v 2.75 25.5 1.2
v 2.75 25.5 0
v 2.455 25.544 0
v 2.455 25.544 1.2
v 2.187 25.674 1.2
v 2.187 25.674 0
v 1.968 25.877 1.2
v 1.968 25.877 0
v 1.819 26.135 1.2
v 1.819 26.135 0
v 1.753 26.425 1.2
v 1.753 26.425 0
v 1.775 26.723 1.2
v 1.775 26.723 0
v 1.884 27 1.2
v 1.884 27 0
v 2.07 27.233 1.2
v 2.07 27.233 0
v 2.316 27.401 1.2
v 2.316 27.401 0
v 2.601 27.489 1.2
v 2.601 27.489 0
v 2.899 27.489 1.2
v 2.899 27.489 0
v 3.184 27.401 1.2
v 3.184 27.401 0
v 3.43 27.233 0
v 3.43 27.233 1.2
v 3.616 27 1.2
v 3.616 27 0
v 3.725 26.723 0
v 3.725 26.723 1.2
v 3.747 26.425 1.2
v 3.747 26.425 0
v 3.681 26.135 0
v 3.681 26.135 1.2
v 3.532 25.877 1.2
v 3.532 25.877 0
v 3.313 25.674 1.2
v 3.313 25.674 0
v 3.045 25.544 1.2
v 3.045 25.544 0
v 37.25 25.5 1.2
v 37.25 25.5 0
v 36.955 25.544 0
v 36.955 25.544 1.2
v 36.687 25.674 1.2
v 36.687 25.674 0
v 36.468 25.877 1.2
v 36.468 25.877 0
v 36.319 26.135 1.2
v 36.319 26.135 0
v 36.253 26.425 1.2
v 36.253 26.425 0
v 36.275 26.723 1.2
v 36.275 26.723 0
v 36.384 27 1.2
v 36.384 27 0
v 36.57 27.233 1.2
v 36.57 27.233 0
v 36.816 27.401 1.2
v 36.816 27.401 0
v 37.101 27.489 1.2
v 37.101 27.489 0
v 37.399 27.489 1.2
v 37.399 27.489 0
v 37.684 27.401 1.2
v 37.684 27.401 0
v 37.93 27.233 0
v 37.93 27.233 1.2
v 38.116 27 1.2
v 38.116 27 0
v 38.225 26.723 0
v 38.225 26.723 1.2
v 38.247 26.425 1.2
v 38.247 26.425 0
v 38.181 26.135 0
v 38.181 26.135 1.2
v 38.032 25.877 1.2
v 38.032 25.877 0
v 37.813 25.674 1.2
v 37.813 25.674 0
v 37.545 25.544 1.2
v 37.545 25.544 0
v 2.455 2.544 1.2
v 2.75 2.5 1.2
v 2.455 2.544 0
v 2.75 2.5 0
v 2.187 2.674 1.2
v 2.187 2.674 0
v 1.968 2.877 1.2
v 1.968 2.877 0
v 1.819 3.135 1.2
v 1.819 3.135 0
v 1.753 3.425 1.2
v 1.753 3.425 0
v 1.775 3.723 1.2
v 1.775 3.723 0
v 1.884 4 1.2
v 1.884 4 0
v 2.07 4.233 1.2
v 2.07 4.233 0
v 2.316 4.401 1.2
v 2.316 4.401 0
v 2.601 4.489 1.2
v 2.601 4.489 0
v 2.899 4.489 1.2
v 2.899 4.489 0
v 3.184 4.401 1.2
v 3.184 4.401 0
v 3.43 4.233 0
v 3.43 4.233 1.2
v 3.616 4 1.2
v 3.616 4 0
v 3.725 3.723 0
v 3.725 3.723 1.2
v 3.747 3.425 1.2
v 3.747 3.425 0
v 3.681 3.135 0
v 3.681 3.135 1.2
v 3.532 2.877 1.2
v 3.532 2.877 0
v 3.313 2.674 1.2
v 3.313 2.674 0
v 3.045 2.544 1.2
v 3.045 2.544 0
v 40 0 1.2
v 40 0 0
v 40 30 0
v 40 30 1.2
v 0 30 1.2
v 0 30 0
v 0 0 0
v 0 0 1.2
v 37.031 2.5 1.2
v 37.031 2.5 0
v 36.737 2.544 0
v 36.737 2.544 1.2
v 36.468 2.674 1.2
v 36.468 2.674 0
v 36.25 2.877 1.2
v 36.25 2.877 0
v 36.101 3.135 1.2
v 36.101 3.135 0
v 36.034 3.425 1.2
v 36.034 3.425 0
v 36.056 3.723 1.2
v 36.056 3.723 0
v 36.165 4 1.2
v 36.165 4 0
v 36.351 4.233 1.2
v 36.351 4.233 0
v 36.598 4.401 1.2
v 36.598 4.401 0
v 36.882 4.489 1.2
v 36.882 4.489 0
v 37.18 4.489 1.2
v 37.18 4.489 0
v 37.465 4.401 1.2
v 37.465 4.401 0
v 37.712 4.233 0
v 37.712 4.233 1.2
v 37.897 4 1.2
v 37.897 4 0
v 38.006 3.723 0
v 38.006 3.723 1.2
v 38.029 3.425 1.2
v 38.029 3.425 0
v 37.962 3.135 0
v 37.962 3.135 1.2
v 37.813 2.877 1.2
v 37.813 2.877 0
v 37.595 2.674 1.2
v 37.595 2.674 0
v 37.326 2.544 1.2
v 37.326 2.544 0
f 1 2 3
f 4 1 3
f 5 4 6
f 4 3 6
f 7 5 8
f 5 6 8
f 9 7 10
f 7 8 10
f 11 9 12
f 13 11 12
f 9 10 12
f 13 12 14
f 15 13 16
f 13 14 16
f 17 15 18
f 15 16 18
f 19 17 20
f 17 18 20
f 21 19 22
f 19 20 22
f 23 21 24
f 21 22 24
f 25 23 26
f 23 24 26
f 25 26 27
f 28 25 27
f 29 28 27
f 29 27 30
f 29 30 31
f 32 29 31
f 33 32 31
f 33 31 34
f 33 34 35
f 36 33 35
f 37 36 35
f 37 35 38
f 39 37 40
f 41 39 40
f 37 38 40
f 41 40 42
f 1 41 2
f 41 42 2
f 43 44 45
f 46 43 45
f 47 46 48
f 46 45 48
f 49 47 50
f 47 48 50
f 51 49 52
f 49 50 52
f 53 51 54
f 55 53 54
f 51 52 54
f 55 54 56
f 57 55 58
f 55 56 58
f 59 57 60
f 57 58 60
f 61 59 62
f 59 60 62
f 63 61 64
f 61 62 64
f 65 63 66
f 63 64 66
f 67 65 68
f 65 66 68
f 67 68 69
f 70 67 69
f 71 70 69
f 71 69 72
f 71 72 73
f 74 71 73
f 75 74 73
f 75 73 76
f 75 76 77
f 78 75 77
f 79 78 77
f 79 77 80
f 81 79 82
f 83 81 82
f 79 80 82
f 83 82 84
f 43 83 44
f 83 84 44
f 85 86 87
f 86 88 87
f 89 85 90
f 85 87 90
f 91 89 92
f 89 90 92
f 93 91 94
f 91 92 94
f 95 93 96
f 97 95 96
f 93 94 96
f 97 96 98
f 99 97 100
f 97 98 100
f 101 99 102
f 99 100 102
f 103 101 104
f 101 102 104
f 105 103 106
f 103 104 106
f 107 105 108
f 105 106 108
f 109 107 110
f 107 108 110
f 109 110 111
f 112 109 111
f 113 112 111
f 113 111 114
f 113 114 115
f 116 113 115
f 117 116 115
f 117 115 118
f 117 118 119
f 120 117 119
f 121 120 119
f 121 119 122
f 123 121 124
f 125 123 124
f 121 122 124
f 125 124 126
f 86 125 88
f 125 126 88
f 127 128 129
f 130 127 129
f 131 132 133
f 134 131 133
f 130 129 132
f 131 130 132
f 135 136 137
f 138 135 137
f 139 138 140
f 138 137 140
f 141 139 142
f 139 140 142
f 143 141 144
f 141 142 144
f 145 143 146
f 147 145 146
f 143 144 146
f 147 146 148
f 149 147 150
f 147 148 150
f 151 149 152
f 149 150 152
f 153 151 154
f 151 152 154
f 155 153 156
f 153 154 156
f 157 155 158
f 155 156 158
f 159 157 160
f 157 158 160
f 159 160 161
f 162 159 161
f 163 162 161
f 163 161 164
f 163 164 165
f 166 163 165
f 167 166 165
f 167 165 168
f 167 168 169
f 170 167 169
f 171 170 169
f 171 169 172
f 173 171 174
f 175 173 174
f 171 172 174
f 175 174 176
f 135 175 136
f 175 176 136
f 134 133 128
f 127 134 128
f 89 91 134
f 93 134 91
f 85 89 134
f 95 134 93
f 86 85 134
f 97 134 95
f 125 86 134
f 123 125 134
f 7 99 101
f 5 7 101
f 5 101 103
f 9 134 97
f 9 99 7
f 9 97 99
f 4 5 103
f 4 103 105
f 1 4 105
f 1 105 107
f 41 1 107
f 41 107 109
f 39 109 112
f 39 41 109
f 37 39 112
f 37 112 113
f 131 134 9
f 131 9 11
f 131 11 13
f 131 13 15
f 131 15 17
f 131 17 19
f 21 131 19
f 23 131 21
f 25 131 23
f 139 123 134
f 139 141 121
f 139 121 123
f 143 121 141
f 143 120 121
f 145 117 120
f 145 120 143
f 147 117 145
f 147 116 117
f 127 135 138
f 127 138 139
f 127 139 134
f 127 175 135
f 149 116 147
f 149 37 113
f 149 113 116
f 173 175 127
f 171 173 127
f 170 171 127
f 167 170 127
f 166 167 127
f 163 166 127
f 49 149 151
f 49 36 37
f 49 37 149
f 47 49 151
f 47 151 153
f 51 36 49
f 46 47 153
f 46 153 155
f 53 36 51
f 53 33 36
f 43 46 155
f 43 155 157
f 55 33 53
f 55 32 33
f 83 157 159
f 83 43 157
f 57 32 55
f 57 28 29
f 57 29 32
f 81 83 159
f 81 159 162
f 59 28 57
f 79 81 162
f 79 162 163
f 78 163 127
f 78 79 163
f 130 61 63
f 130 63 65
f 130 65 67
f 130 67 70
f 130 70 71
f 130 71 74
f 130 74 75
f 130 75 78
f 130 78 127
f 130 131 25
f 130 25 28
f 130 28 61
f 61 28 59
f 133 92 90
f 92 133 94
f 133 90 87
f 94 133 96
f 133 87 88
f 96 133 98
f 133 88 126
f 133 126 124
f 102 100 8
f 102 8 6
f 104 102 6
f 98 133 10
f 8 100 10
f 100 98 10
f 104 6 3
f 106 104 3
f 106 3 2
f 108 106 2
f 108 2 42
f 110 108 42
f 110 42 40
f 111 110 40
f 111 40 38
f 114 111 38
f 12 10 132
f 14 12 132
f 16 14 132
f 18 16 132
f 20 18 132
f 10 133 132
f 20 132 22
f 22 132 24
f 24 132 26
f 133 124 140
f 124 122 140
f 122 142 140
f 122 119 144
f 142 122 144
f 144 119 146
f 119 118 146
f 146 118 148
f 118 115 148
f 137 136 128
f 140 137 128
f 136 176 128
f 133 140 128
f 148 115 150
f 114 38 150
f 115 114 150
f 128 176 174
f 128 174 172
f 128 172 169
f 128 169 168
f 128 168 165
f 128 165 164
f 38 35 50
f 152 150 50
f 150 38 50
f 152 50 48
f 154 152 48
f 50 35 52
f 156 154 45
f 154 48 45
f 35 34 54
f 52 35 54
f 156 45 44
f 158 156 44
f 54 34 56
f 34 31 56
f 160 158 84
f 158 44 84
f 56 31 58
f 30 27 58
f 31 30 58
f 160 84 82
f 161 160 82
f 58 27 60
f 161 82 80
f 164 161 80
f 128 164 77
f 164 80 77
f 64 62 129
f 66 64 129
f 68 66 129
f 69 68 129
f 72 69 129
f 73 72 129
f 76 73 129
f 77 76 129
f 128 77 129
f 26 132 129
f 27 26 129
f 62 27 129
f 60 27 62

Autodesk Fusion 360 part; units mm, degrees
sketch "Sketch1" plane through (0, 0, 0) normal (0, 0, 1) x (1, 0, 0)
  line L0 (0, 0) -> (40, 0)
  line L1 (40, 0) -> (40, 30)
  line L2 (40, 30) -> (0, 30)
  line L3 (0, 30) -> (0, 0)
  dimension "d1" = 40
  dimension "d2" = 30
extrude "Extrude1" add sketch "Sketch1" along normal blind 1.2
sketch "Sketch2" plane through (0, 0, 1.2) normal (0, 0, 1) x (-1, 0, 0)
  line L0 (0, -30) -> (0, 0)
  line L1 (0, 0) -> (-40, 0)
  line L2 (-40, 0) -> (-40, -30)
  line L3 (-40, -30) -> (0, -30)
sketch "Sketch3" plane through (0, 0, 1.2) normal (0, 0, 1) x (-1, 0, 0)
sketch "Sketch4" plane through (0, 0, 1.2) normal (0, 0, 1) x (-1, 0, 0)
  line L0 (-40, 0) -> (-40, -30)
  line L1 (-40, -30) -> (0, -30)
  circle A0 centre (-2.75, -26.5) radius 1
  circle A1 centre (-2.75, -3.5) radius 1
  circle A2 centre (-37.25, -26.5) radius 1
  circle A3 centre (-37.0314, -3.5) radius 1
  point P0 (-20, -30)
  point P1 (-40, -15)
  point P2 (-37.25, -26.5)
  point P3 (-37.0314, -3.5)
  point P4 (-2.75, -26.5)
  point P5 (-2.75, -3.5)
  dimension "d8" = 11.5
  dimension "d9" = 17.25
  dimension "d10" = 23
  dimension "d11" = 34.5
  dimension "d12" = 2
  dimension "d13" = 2
  dimension "d14" = 2
  dimension "d15" = 2
hole "Hole1" at (2.75, 3.5, 1.2) at (37.0314, 3.5, 1.2) at (37.25, 26.5, 1.2) at (2.75, 26.5, 1.2) direction (0, 0, -1) diameter 2 depth 1.5 tip angle 180
